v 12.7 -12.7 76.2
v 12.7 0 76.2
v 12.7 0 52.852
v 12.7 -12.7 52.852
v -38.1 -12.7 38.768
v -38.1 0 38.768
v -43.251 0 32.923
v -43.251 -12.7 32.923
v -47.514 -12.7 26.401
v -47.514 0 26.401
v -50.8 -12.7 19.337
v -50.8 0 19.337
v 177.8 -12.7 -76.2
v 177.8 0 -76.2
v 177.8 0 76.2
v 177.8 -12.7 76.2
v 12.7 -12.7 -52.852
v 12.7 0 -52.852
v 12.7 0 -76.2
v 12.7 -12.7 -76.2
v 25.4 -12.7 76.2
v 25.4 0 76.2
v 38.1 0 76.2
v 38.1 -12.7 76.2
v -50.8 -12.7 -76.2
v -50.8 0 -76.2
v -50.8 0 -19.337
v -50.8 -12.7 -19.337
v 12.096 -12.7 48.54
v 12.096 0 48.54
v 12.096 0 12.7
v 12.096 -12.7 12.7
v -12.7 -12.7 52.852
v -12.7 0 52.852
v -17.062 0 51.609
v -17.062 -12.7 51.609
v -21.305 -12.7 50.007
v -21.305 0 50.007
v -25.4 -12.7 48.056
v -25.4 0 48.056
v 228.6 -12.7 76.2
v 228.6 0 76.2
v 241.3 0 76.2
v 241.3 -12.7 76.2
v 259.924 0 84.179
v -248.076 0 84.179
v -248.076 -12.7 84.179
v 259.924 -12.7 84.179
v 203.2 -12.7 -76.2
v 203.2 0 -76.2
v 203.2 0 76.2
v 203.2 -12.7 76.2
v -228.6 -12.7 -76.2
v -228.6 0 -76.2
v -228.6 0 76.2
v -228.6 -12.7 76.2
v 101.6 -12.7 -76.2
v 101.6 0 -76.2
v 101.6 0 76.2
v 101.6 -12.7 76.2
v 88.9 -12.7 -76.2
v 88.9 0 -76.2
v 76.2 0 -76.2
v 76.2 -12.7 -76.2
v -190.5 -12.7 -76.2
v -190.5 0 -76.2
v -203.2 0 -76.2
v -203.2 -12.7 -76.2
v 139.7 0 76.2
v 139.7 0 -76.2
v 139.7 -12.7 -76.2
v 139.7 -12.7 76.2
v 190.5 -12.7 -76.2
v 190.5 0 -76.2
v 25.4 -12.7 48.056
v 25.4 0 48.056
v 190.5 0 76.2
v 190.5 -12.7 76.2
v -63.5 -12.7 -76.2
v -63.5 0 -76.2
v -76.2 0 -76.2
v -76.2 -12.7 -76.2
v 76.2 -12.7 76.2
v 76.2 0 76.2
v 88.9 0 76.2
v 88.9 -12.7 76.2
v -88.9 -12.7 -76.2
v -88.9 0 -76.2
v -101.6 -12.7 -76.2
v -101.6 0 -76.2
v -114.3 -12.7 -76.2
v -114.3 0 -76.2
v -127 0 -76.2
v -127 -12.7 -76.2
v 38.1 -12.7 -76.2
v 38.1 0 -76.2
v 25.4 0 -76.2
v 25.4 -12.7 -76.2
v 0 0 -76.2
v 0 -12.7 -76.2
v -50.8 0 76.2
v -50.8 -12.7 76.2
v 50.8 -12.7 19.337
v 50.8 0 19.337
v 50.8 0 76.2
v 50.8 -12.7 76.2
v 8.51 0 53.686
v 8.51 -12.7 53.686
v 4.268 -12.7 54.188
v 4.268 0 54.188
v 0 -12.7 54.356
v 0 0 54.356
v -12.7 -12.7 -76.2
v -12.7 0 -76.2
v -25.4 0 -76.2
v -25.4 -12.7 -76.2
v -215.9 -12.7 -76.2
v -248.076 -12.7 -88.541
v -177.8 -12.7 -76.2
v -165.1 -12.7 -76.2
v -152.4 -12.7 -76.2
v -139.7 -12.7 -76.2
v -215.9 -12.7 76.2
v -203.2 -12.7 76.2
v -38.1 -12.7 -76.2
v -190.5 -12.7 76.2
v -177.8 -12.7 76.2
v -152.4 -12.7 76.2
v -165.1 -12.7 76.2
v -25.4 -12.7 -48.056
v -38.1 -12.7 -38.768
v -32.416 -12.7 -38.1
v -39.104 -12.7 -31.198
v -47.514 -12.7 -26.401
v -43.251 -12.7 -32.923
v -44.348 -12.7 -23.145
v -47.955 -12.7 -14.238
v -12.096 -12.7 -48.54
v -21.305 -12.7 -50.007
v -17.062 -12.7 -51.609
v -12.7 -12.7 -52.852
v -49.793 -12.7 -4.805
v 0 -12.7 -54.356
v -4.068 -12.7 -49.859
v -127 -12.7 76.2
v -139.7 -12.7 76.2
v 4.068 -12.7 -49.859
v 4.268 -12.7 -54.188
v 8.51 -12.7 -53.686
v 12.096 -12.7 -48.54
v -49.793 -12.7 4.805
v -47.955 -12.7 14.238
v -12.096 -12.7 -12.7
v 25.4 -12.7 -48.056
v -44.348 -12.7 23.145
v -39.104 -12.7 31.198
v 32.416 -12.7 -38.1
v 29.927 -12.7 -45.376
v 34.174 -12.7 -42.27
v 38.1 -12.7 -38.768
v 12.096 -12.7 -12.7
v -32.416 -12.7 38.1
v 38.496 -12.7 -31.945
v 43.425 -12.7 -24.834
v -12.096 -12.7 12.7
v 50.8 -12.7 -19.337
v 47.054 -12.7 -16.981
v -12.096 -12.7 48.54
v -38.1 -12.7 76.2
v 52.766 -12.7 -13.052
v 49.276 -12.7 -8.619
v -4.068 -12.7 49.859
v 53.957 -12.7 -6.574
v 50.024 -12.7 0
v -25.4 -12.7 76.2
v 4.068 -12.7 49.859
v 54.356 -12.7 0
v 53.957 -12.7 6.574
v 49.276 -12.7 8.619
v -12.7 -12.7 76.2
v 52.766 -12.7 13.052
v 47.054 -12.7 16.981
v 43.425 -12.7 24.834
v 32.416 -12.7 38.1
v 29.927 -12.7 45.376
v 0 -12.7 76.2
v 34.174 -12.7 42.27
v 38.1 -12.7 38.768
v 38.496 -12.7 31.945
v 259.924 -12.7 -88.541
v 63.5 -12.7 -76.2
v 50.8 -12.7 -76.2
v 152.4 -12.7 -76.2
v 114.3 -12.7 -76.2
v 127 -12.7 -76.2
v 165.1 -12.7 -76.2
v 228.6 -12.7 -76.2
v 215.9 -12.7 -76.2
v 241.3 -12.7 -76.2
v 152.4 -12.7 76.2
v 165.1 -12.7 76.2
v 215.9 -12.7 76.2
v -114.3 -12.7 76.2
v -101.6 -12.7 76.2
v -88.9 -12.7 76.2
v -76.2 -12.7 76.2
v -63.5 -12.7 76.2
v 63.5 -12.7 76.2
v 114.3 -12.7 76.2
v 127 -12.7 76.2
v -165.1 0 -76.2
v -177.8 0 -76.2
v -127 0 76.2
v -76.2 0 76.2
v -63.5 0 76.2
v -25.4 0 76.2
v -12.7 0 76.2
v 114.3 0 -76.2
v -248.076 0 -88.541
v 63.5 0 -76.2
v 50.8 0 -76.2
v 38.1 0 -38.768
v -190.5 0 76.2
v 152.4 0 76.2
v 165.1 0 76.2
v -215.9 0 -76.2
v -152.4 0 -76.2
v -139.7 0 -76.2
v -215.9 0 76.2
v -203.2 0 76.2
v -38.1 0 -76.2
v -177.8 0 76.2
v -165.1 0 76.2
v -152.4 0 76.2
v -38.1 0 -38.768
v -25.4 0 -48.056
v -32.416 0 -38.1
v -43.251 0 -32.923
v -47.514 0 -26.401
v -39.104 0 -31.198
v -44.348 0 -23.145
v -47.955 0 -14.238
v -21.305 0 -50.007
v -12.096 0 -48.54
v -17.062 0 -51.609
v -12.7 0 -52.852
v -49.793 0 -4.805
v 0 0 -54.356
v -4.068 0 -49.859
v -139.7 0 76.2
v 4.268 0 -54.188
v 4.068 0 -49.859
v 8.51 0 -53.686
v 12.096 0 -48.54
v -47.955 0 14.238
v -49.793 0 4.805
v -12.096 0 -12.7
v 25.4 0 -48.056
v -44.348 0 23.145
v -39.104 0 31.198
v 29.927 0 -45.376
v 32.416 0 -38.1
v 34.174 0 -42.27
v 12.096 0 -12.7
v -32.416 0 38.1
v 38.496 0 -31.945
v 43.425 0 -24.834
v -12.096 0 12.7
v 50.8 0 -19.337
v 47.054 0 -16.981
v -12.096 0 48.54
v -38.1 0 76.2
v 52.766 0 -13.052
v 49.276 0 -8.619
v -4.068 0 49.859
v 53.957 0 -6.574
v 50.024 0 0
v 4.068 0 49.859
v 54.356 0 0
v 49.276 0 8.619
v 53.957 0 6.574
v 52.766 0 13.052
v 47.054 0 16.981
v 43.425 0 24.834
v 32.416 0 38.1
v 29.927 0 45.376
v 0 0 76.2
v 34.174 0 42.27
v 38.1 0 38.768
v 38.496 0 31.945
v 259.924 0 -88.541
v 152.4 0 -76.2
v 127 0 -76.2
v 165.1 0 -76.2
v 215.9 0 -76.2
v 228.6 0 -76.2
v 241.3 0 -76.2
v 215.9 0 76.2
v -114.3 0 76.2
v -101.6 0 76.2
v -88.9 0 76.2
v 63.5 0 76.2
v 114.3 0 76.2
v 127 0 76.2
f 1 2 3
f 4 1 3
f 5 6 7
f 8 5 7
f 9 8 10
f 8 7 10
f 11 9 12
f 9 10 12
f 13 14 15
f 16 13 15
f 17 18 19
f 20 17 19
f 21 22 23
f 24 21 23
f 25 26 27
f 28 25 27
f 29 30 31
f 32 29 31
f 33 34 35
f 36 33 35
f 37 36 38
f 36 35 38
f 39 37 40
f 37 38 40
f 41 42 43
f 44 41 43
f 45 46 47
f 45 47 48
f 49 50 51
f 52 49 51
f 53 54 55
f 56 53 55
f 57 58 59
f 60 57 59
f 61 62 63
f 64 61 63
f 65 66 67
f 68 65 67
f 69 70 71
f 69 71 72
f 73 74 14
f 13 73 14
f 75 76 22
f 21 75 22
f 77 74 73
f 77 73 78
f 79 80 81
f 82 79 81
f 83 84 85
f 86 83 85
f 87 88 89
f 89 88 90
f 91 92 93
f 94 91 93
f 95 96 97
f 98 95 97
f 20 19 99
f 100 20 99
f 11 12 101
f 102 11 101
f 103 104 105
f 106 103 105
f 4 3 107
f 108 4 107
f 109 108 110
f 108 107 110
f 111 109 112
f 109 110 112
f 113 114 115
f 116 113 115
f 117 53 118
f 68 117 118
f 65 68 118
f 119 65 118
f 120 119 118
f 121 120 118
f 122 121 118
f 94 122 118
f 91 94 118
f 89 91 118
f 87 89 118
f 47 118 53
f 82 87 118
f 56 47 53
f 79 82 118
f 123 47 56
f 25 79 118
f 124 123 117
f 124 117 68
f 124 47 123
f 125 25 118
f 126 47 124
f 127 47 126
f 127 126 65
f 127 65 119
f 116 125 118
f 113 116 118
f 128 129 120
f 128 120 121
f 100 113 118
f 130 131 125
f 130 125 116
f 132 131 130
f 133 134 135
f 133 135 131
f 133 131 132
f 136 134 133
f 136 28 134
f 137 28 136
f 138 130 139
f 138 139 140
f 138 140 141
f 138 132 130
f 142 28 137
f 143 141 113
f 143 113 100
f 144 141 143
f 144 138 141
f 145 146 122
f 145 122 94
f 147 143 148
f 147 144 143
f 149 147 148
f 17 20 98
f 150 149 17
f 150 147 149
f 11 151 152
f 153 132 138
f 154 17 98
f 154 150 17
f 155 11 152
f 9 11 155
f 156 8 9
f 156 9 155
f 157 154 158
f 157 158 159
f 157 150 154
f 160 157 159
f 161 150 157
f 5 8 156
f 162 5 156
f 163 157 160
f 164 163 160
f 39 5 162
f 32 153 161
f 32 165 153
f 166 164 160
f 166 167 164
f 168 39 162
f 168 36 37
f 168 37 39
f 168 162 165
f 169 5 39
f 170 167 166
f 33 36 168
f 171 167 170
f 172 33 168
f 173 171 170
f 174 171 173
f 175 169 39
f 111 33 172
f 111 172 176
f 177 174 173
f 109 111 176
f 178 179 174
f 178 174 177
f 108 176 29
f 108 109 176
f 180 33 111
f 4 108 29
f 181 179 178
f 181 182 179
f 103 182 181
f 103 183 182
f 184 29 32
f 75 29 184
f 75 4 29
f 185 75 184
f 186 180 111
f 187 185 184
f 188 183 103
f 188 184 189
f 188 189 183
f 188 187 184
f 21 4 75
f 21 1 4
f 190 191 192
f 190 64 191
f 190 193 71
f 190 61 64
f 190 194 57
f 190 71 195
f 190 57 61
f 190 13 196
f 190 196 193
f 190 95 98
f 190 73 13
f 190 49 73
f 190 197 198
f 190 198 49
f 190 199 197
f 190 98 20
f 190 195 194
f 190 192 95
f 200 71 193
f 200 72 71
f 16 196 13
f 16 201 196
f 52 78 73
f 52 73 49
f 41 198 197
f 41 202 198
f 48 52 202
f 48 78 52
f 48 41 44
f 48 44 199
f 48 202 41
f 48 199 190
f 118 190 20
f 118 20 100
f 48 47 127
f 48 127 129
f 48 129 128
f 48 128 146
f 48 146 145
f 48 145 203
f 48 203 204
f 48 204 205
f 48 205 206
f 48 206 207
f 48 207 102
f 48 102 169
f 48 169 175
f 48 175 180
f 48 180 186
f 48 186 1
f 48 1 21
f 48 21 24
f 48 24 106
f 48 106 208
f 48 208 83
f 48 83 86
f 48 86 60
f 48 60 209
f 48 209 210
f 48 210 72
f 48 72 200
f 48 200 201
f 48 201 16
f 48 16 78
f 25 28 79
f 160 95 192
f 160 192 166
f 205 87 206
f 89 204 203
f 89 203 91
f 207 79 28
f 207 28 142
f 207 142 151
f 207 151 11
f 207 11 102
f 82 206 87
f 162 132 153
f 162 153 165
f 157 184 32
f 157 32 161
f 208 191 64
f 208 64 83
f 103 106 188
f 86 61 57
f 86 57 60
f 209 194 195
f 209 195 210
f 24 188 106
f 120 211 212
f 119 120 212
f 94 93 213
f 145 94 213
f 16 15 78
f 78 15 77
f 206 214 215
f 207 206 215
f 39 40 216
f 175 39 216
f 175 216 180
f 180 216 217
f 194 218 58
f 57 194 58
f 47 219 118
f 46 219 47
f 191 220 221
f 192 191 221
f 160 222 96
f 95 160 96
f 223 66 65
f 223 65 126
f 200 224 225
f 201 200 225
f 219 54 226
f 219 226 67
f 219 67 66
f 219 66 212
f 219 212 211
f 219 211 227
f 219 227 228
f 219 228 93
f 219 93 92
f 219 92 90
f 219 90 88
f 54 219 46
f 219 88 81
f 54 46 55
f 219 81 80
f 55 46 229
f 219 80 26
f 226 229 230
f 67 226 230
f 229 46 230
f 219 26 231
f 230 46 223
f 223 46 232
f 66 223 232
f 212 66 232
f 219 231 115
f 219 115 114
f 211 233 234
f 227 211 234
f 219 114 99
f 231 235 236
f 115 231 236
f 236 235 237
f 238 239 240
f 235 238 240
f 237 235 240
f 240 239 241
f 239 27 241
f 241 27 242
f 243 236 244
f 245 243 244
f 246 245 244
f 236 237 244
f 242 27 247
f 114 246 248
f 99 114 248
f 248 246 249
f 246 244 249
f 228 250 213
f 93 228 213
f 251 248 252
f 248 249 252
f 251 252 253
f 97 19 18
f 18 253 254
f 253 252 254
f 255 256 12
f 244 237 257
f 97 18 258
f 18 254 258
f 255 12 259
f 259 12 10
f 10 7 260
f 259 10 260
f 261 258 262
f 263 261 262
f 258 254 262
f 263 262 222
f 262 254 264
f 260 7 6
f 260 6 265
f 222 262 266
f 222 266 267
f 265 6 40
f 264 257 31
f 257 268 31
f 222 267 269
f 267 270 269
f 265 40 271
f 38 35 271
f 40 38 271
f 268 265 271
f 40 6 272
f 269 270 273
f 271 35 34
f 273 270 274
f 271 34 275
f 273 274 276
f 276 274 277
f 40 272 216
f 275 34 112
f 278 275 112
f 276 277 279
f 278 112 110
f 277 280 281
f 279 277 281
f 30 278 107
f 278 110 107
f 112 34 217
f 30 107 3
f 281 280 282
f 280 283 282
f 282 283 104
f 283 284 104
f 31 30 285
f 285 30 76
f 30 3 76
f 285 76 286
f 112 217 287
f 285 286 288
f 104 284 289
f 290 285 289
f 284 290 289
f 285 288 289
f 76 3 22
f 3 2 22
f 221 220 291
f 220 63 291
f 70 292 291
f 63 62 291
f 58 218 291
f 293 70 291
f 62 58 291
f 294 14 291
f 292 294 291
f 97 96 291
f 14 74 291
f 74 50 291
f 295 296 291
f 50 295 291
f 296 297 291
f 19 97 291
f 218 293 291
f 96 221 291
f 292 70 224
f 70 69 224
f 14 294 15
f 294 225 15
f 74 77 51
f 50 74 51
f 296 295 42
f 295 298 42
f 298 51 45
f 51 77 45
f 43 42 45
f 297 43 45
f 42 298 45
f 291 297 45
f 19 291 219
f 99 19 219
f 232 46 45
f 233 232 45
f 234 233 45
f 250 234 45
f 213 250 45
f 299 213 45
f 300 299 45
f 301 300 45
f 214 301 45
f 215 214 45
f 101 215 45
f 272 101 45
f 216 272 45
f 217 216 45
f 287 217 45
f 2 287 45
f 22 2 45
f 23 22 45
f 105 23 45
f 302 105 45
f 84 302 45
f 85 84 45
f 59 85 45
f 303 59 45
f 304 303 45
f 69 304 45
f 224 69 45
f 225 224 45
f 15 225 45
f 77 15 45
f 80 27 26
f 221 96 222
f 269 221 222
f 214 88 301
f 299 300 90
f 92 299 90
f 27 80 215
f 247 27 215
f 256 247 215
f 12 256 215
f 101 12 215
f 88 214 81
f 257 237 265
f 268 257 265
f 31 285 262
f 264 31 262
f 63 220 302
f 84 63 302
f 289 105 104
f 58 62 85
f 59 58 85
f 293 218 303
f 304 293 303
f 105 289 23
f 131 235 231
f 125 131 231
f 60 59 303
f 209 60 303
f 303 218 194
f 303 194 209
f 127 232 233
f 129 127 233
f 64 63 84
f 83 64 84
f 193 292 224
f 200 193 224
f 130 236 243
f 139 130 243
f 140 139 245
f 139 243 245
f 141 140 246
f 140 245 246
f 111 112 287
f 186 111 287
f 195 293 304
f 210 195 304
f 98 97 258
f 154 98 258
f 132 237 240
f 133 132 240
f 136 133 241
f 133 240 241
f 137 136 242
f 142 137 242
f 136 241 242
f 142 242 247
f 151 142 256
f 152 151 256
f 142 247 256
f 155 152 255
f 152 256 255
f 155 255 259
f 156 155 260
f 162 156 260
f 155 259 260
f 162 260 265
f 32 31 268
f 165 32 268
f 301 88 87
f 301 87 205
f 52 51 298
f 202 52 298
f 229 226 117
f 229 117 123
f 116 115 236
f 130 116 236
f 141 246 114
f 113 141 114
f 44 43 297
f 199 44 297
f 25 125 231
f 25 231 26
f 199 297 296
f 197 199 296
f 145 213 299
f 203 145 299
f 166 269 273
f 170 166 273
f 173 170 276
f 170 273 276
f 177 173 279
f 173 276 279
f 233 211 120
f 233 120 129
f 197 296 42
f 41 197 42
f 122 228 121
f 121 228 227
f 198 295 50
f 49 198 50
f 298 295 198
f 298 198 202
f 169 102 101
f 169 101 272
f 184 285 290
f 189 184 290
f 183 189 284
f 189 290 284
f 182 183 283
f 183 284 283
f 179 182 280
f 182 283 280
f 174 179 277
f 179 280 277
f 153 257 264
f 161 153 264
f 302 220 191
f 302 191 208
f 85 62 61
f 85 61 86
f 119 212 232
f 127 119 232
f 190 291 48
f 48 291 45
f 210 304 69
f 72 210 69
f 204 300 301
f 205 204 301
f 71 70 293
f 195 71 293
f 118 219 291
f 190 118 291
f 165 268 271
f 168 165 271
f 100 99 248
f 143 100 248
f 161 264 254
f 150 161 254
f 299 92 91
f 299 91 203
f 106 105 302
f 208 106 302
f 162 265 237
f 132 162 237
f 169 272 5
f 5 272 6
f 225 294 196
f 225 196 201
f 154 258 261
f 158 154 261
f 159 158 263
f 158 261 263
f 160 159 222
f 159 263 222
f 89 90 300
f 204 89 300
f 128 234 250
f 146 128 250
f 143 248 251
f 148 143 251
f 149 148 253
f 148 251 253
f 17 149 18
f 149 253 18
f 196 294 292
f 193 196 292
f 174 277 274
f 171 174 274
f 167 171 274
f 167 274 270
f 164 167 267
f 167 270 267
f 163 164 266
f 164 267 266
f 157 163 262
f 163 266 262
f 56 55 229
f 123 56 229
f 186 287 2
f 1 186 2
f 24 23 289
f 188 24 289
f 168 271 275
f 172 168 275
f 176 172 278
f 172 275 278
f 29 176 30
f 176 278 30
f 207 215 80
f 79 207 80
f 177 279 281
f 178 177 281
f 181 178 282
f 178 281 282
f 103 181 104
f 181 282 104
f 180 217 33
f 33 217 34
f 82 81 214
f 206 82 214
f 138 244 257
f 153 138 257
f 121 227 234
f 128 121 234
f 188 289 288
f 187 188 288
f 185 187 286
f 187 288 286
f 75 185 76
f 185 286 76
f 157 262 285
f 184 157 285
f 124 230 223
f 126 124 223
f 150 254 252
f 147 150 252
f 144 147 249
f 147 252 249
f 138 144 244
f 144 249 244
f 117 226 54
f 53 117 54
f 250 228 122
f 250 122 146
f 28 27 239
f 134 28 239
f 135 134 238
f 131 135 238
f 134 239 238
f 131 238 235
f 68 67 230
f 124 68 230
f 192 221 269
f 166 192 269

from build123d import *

# Parameters (mm, degrees)
F0_W     = 508
F0_H     = 172.72
F0_W_2   = 12.7
F0_H_2   = 152.4
F1_DEPTH = 12.7


# Not quite as in the source:
# - a feature names something its author has since deleted; it is built from what else it names


with BuildPart() as f1:
    # F0 (on Front) → F1 (new body)
    with BuildSketch(Plane.XZ):
        with Locations((5.9242316484, -2.1814669756)):
            Rectangle(F0_W, F0_H)
        Polygon((215.9, 76.2), (228.6, 76.2), (241.3, 76.2), (241.3, -76.2), (228.6, -76.2), (215.9, -76.2), (203.2, -76.2), (190.5, -76.2), (177.8, -76.2), (165.1, -76.2), (152.4, -76.2), (139.7, -76.2), (127, -76.2), (114.3, -76.2), (101.6, -76.2), (88.9, -76.2), (76.2, -76.2), (63.5, -76.2), (50.8, -76.2), (38.1, -76.2), (25.4, -76.2), (12.7, -76.2), (0, -76.2), (-12.7, -76.2), (-25.4, -76.2), (-38.1, -76.2), (-50.8, -76.2), (-63.5, -76.2), (-76.2, -76.2), (-88.9, -76.2), (-101.6, -76.2), (-114.3, -76.2), (-127, -76.2), (-139.7, -76.2), (-152.4, -76.2), (-165.1, -76.2), (-177.8, -76.2), (-190.5, -76.2), (-203.2, -76.2), (-215.9, -76.2), (-228.6, -76.2), (-228.6, 76.2), (-215.9, 76.2), (-203.2, 76.2), (-190.5, 76.2), (-177.8, 76.2), (-165.1, 76.2), (-152.4, 76.2), (-139.7, 76.2), (-127, 76.2), (-114.3, 76.2), (-101.6, 76.2), (-88.9, 76.2), (-76.2, 76.2), (-63.5, 76.2), (-50.8, 76.2), (-38.1, 76.2), (-25.4, 76.2), (-12.7, 76.2), (0, 76.2), (12.7, 76.2), (25.4, 76.2), (38.1, 76.2), (50.8, 76.2), (63.5, 76.2), (76.2, 76.2), (88.9, 76.2), (101.6, 76.2), (114.3, 76.2), (127, 76.2), (139.7, 76.2), (152.4, 76.2), (165.1, 76.2), (177.8, 76.2), (190.5, 76.2), (203.2, 76.2), align=None, mode=Mode.SUBTRACT)
        with BuildLine():
            ThreePointArc((54.3560246605, 0), (53.4596271482, 9.8308535779), (50.8, 19.3374614904))
            ThreePointArc((50.8, 19.3374614904), (45.4993423984, 29.7386492331), (38.1, 38.7681237216))
            ThreePointArc((38.1, 38.7681237216), (32.0878561317, 43.8742168678), (25.4, 48.056398293))
            ThreePointArc((25.4, 48.056398293), (19.2002837078, 50.8520060807), (12.7, 52.8515602125))
            ThreePointArc((12.7, 52.8515602125), (6.3944001532, 53.9785981994), (0, 54.3560246605))
            ThreePointArc((0, 54.3560246605), (-6.3944001532, 53.9785981994), (-12.7, 52.8515602125))
            ThreePointArc((-12.7, 52.8515602125), (-19.2002837078, 50.8520060807), (-25.4, 48.056398293))
            ThreePointArc((-25.4, 48.056398293), (-32.0878561317, 43.8742168678), (-38.1, 38.7681237216))
            ThreePointArc((-38.1, 38.7681237216), (-45.4993423984, 29.7386492331), (-50.8, 19.3374614904))
            ThreePointArc((-50.8, 19.3374614904), (-54.3560246605, 0), (-50.8, -19.3374614904))
            ThreePointArc((-50.8, -19.3374614904), (-45.4993423984, -29.7386492331), (-38.1, -38.7681237216))
            ThreePointArc((-38.1, -38.7681237216), (-32.0878561317, -43.8742168678), (-25.4, -48.056398293))
            ThreePointArc((-25.4, -48.056398293), (-19.2002837078, -50.8520060807), (-12.7, -52.8515602125))
            ThreePointArc((-12.7, -52.8515602125), (-6.3944001532, -53.9785981994), (0, -54.3560246605))
            ThreePointArc((0, -54.3560246605), (6.3944001532, -53.9785981994), (12.7, -52.8515602125))
            ThreePointArc((12.7, -52.8515602125), (19.2002837078, -50.8520060807), (25.4, -48.056398293))
            ThreePointArc((25.4, -48.056398293), (32.0878561317, -43.8742168678), (38.1, -38.7681237216))
            ThreePointArc((38.1, -38.7681237216), (45.4993423984, -29.7386492331), (50.8, -19.3374614904))
            ThreePointArc((50.8, -19.3374614904), (53.4596271482, -9.8308535779), (54.3560246605, 0))
        make_face()
        with BuildLine():
            ThreePointArc((32.4163123757, 38.1), (45.4094130092, 20.9860076765), (50.0242671914, 0))
            ThreePointArc((50.0242671914, 0), (45.4094130092, -20.9860076765), (32.4163123757, -38.1))
            ThreePointArc((32.4163123757, -38.1), (22.8602382496, -44.4953572321), (12.0963123757, -48.5397418097))
            ThreePointArc((12.0963123757, -48.5397418097), (0, -50.0242671914), (-12.0963123757, -48.5397418097))
            ThreePointArc((-12.0963123757, -48.5397418097), (-22.8602382496, -44.4953572321), (-32.4163123757, -38.1))
            ThreePointArc((-32.4163123757, -38.1), (-50.0242671914, 0), (-32.4163123757, 38.1))
            ThreePointArc((-32.4163123757, 38.1), (-22.8602382496, 44.4953572321), (-12.0963123757, 48.5397418097))
            ThreePointArc((-12.0963123757, 48.5397418097), (0, 50.0242671914), (12.0963123757, 48.5397418097))
            ThreePointArc((12.0963123757, 48.5397418097), (22.8602382496, 44.4953572321), (32.4163123757, 38.1))
        make_face(mode=Mode.SUBTRACT)
        Polygon((32.4163123757, -38.1), (32.4163123757, 38.1), (12.0963123757, 38.1), (12.0963123757, 12.7), (-12.0963123757, 12.7), (-12.0963123757, 38.1), (-32.4163123757, 38.1), (-32.4163123757, -38.1), (-12.0963123757, -38.1), (-12.0963123757, -12.7), (12.0963123757, -12.7), (12.0963123757, -38.1), align=None)
        with Locations((-209.55, 0)):
            Rectangle(F0_W_2, F0_H_2)
        with Locations((-184.15, 0)):
            Rectangle(F0_W_2, F0_H_2)
        with Locations((-158.75, 0)):
            Rectangle(F0_W_2, F0_H_2)
        with Locations((-133.35, 0)):
            Rectangle(F0_W_2, F0_H_2)
        with Locations((-107.95, 0)):
            Rectangle(F0_W_2, F0_H_2)
        with Locations((-82.55, 0)):
            Rectangle(F0_W_2, F0_H_2)
        with Locations((69.85, 0)):
            Rectangle(F0_W_2, F0_H_2)
        with Locations((95.25, 0)):
            Rectangle(F0_W_2, F0_H_2)
        with Locations((120.65, 0)):
            Rectangle(F0_W_2, F0_H_2)
        with Locations((146.05, 0)):
            Rectangle(F0_W_2, F0_H_2)
        with Locations((171.45, 0)):
            Rectangle(F0_W_2, F0_H_2)
        with Locations((196.85, 0)):
            Rectangle(F0_W_2, F0_H_2)
        with Locations((222.25, 0)):
            Rectangle(F0_W_2, F0_H_2)
        with BuildLine():
            Line((-50.8, 19.3374614904), (-50.8, 76.2))
            Line((-50.8, 76.2), (-63.5, 76.2))
            Line((-63.5, 76.2), (-63.5, -76.2))
            Line((-63.5, -76.2), (-50.8, -76.2))
            Line((-50.8, -76.2), (-50.8, -19.3374614904))
            ThreePointArc((-50.8, -19.3374614904), (-54.3560246605, 0), (-50.8, 19.3374614904))
        make_face()
        with BuildLine():
            Line((50.8, 19.3374614904), (50.8, 76.2))
            Line((50.8, 76.2), (38.1, 76.2))
            Line((38.1, 76.2), (38.1, 38.7681237216))
            ThreePointArc((38.1, 38.7681237216), (45.4993423984, 29.7386492331), (50.8, 19.3374614904))
        make_face()
        with BuildLine():
            Line((38.1, -76.2), (50.8, -76.2))
            Line((50.8, -76.2), (50.8, -19.3374614904))
            ThreePointArc((50.8, -19.3374614904), (45.4993423984, -29.7386492331), (38.1, -38.7681237216))
            Line((38.1, -38.7681237216), (38.1, -76.2))
        make_face()
        with BuildLine():
            Line((-25.4, 48.056398293), (-25.4, 76.2))
            Line((-25.4, 76.2), (-38.1, 76.2))
            Line((-38.1, 76.2), (-38.1, 38.7681237216))
            ThreePointArc((-38.1, 38.7681237216), (-32.0878561317, 43.8742168678), (-25.4, 48.056398293))
        make_face()
        with BuildLine():
            Line((-38.1, -76.2), (-25.4, -76.2))
            Line((-25.4, -76.2), (-25.4, -48.056398293))
            ThreePointArc((-25.4, -48.056398293), (-32.0878561317, -43.8742168678), (-38.1, -38.7681237216))
            Line((-38.1, -38.7681237216), (-38.1, -76.2))
        make_face()
        with BuildLine():
            Line((25.4, 48.056398293), (25.4, 76.2))
            Line((25.4, 76.2), (12.7, 76.2))
            Line((12.7, 76.2), (12.7, 52.8515602125))
            ThreePointArc((12.7, 52.8515602125), (19.2002837078, 50.8520060807), (25.4, 48.056398293))
        make_face()
        with BuildLine():
            Line((12.7, -76.2), (25.4, -76.2))
            Line((25.4, -76.2), (25.4, -48.056398293))
            ThreePointArc((25.4, -48.056398293), (19.2002837078, -50.8520060807), (12.7, -52.8515602125))
            Line((12.7, -52.8515602125), (12.7, -76.2))
        make_face()
        with BuildLine():
            Line((0, 54.3560246605), (0, 76.2))
            Line((0, 76.2), (-12.7, 76.2))
            Line((-12.7, 76.2), (-12.7, 52.8515602125))
            ThreePointArc((-12.7, 52.8515602125), (-6.3944001532, 53.9785981994), (0, 54.3560246605))
        make_face()
        with BuildLine():
            Line((-12.7, -76.2), (0, -76.2))
            Line((0, -76.2), (0, -54.3560246605))
            ThreePointArc((0, -54.3560246605), (-6.3944001532, -53.9785981994), (-12.7, -52.8515602125))
            Line((-12.7, -52.8515602125), (-12.7, -76.2))
        make_face()
        with BuildLine():
            Line((-12.0963123757, 38.1), (-12.0963123757, 48.5397418097))
            ThreePointArc((-12.0963123757, 48.5397418097), (-22.8602382496, 44.4953572321), (-32.4163123757, 38.1))
            Line((-32.4163123757, 38.1), (-12.0963123757, 38.1))
        make_face()
        with BuildLine():
            Line((12.0963123757, 38.1), (32.4163123757, 38.1))
            ThreePointArc((32.4163123757, 38.1), (22.8602382496, 44.4953572321), (12.0963123757, 48.5397418097))
            Line((12.0963123757, 48.5397418097), (12.0963123757, 38.1))
        make_face()
        with BuildLine():
            ThreePointArc((12.0963123757, -48.5397418097), (22.8602382496, -44.4953572321), (32.4163123757, -38.1))
            Line((32.4163123757, -38.1), (12.0963123757, -38.1))
            Line((12.0963123757, -38.1), (12.0963123757, -48.5397418097))
        make_face()
        with BuildLine():
            ThreePointArc((-32.4163123757, -38.1), (-22.8602382496, -44.4953572321), (-12.0963123757, -48.5397418097))
            Line((-12.0963123757, -48.5397418097), (-12.0963123757, -38.1))
            Line((-12.0963123757, -38.1), (-32.4163123757, -38.1))
        make_face()
    extrude(amount=F1_DEPTH)


solid = f1.part
